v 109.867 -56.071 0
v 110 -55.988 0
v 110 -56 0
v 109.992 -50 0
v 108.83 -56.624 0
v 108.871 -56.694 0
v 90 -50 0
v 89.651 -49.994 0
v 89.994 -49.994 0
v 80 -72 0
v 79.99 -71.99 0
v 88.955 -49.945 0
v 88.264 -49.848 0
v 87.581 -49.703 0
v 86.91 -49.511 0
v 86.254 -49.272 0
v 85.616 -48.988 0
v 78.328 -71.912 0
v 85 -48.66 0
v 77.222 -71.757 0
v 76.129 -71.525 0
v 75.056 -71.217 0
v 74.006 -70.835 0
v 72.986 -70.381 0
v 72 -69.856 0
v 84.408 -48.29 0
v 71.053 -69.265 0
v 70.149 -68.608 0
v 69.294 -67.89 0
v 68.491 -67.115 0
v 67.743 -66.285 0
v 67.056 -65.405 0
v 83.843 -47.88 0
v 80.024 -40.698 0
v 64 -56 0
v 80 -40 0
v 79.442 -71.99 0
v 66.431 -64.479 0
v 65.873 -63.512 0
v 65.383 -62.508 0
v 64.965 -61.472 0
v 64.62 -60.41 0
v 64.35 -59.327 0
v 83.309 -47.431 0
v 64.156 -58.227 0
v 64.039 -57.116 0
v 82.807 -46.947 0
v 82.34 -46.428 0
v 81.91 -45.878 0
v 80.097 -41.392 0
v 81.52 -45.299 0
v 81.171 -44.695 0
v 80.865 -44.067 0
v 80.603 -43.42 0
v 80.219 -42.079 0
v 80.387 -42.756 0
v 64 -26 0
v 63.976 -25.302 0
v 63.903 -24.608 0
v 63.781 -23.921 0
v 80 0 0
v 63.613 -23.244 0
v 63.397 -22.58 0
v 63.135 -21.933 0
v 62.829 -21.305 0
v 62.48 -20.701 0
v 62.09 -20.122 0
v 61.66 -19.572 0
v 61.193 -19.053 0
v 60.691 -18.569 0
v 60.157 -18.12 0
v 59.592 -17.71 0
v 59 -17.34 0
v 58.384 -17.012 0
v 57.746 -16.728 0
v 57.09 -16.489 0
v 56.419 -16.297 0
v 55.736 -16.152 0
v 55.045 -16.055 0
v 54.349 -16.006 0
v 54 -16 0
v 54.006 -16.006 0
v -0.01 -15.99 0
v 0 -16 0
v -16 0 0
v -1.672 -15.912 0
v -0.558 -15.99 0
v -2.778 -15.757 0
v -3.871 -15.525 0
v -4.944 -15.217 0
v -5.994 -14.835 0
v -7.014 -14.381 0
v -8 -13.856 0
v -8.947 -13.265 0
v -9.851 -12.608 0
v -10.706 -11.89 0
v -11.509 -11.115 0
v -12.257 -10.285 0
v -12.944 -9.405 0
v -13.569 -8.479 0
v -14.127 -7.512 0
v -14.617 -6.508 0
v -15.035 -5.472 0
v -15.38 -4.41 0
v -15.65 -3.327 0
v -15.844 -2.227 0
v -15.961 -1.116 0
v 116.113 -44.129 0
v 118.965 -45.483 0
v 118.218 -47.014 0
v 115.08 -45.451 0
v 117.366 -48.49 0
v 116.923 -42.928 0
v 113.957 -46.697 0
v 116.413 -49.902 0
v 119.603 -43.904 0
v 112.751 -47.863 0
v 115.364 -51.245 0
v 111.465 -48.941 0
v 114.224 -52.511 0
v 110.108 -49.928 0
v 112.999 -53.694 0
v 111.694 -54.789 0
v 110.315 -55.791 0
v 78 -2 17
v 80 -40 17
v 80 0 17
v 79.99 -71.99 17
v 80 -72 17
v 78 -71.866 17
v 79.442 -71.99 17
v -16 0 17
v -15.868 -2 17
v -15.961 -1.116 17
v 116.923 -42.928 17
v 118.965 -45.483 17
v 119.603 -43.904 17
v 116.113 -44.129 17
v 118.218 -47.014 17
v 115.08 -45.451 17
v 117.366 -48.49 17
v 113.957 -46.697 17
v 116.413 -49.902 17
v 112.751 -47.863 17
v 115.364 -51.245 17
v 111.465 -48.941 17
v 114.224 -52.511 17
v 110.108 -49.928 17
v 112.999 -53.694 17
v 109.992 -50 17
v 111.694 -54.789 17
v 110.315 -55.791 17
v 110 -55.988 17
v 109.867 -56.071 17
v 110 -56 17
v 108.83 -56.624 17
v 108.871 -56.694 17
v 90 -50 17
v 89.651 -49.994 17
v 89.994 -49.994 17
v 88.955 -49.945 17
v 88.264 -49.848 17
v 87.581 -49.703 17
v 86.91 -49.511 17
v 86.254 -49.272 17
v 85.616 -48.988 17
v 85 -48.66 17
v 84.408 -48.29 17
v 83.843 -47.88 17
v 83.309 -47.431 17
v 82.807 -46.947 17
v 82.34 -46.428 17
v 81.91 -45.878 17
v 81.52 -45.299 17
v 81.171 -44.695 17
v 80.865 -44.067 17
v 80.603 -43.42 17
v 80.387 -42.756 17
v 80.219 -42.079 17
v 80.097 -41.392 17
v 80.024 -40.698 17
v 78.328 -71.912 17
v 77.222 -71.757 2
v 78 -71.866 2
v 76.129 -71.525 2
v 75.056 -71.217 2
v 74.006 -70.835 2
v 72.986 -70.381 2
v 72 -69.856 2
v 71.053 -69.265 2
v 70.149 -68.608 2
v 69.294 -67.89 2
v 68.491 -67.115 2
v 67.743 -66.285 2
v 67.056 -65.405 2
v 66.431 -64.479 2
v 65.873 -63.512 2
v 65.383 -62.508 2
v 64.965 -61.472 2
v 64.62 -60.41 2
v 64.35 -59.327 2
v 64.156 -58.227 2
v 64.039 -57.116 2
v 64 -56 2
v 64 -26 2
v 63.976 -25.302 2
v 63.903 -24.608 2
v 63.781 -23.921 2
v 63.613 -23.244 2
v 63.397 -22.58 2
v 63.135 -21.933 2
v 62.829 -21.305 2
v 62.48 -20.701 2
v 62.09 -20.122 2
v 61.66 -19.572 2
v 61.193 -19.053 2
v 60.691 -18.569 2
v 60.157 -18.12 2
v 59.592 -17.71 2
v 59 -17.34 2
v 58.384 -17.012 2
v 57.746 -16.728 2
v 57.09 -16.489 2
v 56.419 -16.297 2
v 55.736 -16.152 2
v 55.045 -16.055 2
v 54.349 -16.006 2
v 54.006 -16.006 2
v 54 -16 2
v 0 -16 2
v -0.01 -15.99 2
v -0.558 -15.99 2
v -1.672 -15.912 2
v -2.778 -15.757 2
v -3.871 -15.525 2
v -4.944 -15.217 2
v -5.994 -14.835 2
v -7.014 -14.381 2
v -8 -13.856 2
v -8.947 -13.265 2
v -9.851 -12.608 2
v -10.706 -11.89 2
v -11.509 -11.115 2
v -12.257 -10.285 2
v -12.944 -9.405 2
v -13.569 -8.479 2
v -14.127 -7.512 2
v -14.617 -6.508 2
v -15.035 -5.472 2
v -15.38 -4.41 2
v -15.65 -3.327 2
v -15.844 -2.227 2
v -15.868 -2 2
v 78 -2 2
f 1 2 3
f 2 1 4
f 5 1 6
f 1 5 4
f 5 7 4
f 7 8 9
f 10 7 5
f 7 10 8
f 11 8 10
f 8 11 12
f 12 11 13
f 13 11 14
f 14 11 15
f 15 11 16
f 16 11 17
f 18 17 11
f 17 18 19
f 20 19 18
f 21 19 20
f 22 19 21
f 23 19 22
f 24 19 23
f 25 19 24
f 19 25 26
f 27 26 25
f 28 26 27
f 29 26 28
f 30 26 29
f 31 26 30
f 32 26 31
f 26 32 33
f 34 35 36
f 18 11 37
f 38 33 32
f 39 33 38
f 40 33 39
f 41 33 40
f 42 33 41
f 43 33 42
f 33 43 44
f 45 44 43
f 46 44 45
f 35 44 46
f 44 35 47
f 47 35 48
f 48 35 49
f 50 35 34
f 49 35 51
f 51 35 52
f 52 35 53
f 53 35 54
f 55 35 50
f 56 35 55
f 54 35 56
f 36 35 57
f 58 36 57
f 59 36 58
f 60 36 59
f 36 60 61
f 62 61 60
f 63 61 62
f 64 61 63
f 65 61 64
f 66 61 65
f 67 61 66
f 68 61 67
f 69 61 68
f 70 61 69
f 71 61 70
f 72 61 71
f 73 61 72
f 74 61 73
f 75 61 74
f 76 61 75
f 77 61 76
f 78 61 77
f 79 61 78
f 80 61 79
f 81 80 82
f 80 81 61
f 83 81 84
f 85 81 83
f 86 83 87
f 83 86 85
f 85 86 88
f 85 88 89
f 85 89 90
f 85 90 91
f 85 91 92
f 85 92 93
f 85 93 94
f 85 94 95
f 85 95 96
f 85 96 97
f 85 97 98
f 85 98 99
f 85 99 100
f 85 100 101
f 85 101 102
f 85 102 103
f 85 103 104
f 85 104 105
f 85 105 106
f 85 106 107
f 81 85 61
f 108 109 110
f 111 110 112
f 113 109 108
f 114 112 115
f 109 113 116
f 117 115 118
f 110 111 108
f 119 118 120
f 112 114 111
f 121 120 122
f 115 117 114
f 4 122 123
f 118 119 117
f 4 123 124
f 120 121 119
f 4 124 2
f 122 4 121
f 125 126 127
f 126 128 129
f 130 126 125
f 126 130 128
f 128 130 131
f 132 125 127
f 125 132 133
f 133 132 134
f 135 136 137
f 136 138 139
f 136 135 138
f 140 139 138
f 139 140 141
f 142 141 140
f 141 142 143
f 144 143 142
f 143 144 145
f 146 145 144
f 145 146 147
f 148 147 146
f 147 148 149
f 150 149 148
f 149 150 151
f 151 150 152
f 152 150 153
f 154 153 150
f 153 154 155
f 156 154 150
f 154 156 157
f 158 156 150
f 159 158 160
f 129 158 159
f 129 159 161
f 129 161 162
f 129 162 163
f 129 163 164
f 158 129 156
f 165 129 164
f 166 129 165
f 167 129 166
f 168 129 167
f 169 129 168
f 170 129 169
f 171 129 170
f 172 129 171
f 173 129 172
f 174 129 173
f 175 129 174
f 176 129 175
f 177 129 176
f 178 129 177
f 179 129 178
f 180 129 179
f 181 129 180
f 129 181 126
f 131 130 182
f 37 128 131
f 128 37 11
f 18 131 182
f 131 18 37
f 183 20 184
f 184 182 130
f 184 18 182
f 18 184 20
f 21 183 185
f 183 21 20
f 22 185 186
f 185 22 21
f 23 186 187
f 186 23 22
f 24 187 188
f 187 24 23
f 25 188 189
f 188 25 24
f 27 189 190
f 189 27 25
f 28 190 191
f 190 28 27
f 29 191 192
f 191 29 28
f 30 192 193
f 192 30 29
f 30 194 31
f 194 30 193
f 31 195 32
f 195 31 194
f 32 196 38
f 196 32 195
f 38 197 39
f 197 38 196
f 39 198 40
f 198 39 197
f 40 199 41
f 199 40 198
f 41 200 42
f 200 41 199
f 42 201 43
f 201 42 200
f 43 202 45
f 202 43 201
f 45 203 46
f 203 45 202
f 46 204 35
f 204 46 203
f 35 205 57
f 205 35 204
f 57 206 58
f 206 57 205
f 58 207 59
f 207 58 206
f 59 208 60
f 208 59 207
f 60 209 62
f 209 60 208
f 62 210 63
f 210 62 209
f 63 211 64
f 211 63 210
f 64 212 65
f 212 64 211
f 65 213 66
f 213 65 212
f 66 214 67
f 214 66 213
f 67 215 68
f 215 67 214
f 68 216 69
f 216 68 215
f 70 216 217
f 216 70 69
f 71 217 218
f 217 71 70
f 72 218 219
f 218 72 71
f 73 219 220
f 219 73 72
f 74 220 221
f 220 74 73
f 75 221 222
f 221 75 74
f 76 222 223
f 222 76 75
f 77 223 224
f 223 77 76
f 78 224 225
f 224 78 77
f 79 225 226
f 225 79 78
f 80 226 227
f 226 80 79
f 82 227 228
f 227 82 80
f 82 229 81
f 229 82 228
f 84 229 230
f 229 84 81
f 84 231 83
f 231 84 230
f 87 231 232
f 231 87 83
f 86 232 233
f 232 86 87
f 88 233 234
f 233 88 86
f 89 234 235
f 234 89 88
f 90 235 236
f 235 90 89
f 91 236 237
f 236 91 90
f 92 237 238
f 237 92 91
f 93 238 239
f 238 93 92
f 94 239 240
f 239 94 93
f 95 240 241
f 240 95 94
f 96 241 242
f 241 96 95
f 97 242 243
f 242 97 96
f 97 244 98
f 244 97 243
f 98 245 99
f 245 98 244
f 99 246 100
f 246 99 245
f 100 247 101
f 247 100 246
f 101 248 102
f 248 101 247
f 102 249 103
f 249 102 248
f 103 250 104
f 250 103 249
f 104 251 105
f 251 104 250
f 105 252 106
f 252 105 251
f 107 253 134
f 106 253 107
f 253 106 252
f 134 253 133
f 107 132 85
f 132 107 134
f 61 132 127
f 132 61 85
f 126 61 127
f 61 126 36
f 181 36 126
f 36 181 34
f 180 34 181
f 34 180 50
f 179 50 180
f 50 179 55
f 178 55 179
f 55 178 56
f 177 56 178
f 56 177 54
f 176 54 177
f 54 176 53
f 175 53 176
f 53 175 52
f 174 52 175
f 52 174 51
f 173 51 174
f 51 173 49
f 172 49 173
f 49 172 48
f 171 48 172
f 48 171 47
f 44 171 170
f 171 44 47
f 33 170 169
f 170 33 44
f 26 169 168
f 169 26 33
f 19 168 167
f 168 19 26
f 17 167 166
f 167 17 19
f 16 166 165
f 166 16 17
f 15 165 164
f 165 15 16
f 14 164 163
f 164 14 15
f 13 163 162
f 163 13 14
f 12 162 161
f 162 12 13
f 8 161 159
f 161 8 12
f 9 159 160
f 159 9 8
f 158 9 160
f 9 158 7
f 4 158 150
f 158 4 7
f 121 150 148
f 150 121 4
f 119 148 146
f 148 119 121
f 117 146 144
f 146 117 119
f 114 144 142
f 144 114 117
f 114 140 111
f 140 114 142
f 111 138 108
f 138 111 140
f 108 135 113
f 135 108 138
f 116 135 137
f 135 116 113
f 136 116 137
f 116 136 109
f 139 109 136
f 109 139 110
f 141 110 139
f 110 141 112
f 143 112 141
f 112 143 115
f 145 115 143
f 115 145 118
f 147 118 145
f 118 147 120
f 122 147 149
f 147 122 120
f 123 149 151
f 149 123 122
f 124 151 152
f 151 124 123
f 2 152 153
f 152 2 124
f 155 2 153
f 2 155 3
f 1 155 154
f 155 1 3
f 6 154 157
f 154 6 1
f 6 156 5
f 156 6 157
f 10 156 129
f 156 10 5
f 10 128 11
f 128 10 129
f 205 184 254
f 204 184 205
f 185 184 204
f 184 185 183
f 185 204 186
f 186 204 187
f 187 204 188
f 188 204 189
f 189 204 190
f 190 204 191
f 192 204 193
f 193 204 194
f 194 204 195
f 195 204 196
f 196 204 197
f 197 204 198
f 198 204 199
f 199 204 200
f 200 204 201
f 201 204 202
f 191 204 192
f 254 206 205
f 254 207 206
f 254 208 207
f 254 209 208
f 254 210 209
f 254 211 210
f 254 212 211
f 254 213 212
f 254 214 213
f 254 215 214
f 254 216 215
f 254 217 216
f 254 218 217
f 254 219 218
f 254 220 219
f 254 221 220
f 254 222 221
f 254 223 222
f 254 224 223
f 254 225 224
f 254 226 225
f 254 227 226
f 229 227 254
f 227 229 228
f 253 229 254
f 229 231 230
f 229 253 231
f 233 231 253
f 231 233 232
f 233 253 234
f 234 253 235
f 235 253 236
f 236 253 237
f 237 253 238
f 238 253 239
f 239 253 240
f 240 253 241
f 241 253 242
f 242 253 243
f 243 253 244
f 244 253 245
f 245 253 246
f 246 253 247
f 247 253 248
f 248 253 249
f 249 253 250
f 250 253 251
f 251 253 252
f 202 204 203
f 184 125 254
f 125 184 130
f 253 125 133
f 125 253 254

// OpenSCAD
// file: arc.scad
//==============================================================================
// (C) COPYRIGHT 2018 TPSEC
// File: MyMonitorHook.scad
//
//
//=============================================================================

/** @defgroup MyMonitorHook Platform to hook the headphones in left/right side of monitor
 *  @ingroup MyMonitorHook
 *  @brief \n

	@details


	Written by Eusebio Tebar
	mailto:etebar AT tpsec DOT com DOT es

	Current version:
	v. 1.0:
 @{
 */

 /**
	@ingroup  MonitorHook
	Desing Status. This definition is used for design status traceability\n
	- Code	 -> State
	- 0x0000 -> Template
	- 0x0001 -> Preliminary
	- 0x0010 -> Debug
	- 0x0100 -> Test
	- 0x1000 -> Release
*/

//MyMonitorHook				(0x0000)

/****************************************************************************
	Parameters
****************************************************************************/

/****************************************************************************
	Modules
****************************************************************************/

module arc180(radius, angle){
	rotate(a = angle, v= [0,0,1])
	difference(){
		circle(radius);
		//rotate(a = angle, v= [0,0,1])
			translate([-radius,0,0])
				square([2*radius,radius],false);
		rotate(a = 90 - angle, v= [0,0,1])
			translate([-radius,-radius,0])
				square([radius,2*radius],false);
	}
}


/****************************************************************************
	Render
****************************************************************************/
// rotate(a = 10, v= [0,0,1])
// 	arc180(10,10);


/*
|| @changelog
|| | Issue		Date		Name			Comment
|| | --------	-----------	------------	---------------------------------
|| | 1.0.0.X 	17/01/2019 - E. Tebar : 	Initial Release
|| #
*/
/***************************************************************************/
/** @} */ /*	End of file */
/***************************************************************************/
// main file
//==============================================================================
// (C) COPYRIGHT 2018 TPSEC
// File: MyMonitorHook.scad
//
//
//=============================================================================

/** @defgroup MyMonitorHook Platform to hook the headphones in left/right side of monitor
 *  @ingroup MyMonitorHook
 *  @brief \n

	@details


	Written by Eusebio Tebar
	mailto:etebar AT tpsec DOT com DOT es

	Current version:
	v. 1.0:
 @{
 */

 /**
	@ingroup  MonitorHook
	Desing Status. This definition is used for design status traceability\n
	- Code	 -> State
	- 0x0000 -> Template
	- 0x0001 -> Preliminary
	- 0x0010 -> Debug
	- 0x0100 -> Test
	- 0x1000 -> Release
*/

//MyMonitorHook				(0x0000)
include <arc.scad>
/****************************************************************************
	Parameters
****************************************************************************/

/* [Hidden] */
$fa = 4;
$fs = 0.5;



height_front=16;
text_line1="D. Santos";
text_line2="Knorr-Bremse";
font_size=6;

hookThickness	= 2;
MonitorHeight	= 17;
hookHeight 		= 40;
hookLength		= 20;
topLength 		= 2*hookHeight;
topBezel 		= 16;
r34 			= 10;
r56 			= 10;
r67 			= 16;
r89				= topBezel;
r1011			= 10;
r1213			= topBezel;

// arcUpCrochet	= 8*r56;
// angleUpCrochet	= 200;									// TODO link with hookLength and hookHeight
arcUpCrochet		= 80;
angleUpCrochet		= 200;
echo(arcUpCrochet,angleUpCrochet);

// arcDownCrochet		= 3.5*r56;
// angleDownCrochet	= 190;
arcDownCrochet		= 40;
angleDownCrochet	= 200;
echo(arcDownCrochet,angleDownCrochet);



/****************************************************************************
	Modules
****************************************************************************/
						
p1x = 0;												p1y = 0;											// echo("p1x  :",p1x ,"p1y :",p1y );	
p2x = p1x-topLength;									p2y = 0;											// echo("p2x  :",p2x ,"p2y :",p2y );	
p3x = p2x;												p3y = p2y - hookHeight;								// echo("p3x  :",p3x ,"p3y :",p3y );	
p4x = p3x - r34;										p4y = p3y - r34;									// echo("p4x  :",p4x ,"p4y :",p4y );	
p5x = p4x - hookLength;									p5y = p4y;											// echo("p5x  :",p5x ,"p5y :",p5y );	
p6x = p5x - r56;										p6y = p5y + r56;									// echo("p6x  :",p6x ,"p6y :",p6y );	
p7x = p5x;												p7y = p5y - (r67-r56);								// echo("p7x  :",p7x ,"p7y :",p7y );	
p8x = p2x;												p8y = p7y - r89;									// echo("p8x  :",p8x ,"p8y :",p8y );	
p9x = p8x + r89;										p9y = p7y;											// echo("p9x  :",p9x ,"p9y :",p9y );	
p10x = p9x;												p10y = -topBezel - r1011;							// echo("p10x :",p10x,"p10y:",p10y);	
p11x = p10x + r1011;									p11y = -topBezel ;									// echo("p11x :",p11x,"p11y:",p11y);	
p12x = p1x;												p12y = p11y;										// echo("p12x :",p12x,"p12y:",p12y);	
p13x = p1x + r1213;										p13y = 0;											// echo("p13x :",p13x,"p13y:",p13y);	

pUpCrochetCenterx = p4x - (1*hookLength/3);				pUpCrochetCentery = p6y + (hookHeight/4);			// echo("pUpCrochetCenterx :",pUpCrochetCenterx,"pUpCrochetCentery:",pUpCrochetCentery);	
pDownCrochetCenterx = p4x - (1*hookLength/3);			pDownCrochetCentery = - (8*hookHeight/9);			// echo("pDownCrochetCenterx :",pDownCrochetCenterx,"pDownCrochetCentery:",pDownCrochetCentery);	


Ux = p5x - pUpCrochetCenterx;																				// echo("Ux",Ux);
Uy = p5y - pUpCrochetCentery;																				// echo("Uy",Uy);
pUpCrochetRadio = sqrt((Ux*Ux)+(Uy*Uy));																	// echo("pDownCrochetRadio",pDownCrochetRadio);


Dx = p7x - pDownCrochetCenterx;																				// echo("Dx",Dx);
Dy = p7y - pDownCrochetCentery;																				// echo("Dy",Dy);
pDownCrochetRadio = sqrt((Dx*Dx)+(Dy*Dy));																	// echo("pDownCrochetRadio",pDownCrochetRadio);

// Side Profile in 2D
module Side_Profile() {

difference(){
	union(){
		polygon	([
				[p1x,p1y],	[p2x,p2y],	[p3x,p3y],	[p4x,p4y],	[p5x,p5y],	//[p6x,p6y],
				[p7x,p7y],	[p8x,p8y],	[p9x,p9y],	[p10x,p10y],[p11x,p11y],[p12x,p12y],
				[p13x,p13y]
				]);
		rotate(a = -90, v= [0,0,1])
			 arc180(r1213,90);

		translate([p8x,p9y,0])
			rotate(a = -90, v= [0,0,1])
				arc180(r89,90);

		Crochet();
		}
	translate([p4x,p3y,0])
		rotate(a = -90, v= [0,0,1])
			arc180(r34,90);

	translate([p11x,p10y,0])
		rotate(a = 90, v= [0,0,1])
			arc180(r1011,90);

	}
}

module Crochet(){

	difference(){
		 translate([pDownCrochetCenterx,pDownCrochetCentery,0])
		  	rotate(a = angleDownCrochet, v= [0,0,1])
		 	 	 arc180(pDownCrochetRadio,arcDownCrochet);

		translate([pUpCrochetCenterx,pUpCrochetCentery,0])
		 	rotate(a = angleUpCrochet, v= [0,0,1])
		 	 	 arc180(pUpCrochetRadio,arcUpCrochet);
		}
}

module Hook(MirrorOption, withtext){
	difference(){
	// Profile extruded
	linear_extrude(height = MonitorHeight) 
	 	Side_Profile();

	// Remove material
	translate([p2x+hookThickness,  p8y - hookThickness, hookThickness])
		cube([topLength+p13x,-p8y,MonitorHeight]);		//echo("cubo :",topLength+p13x,-p8y,MonitorHeight);

	// text on the board

	mirror([MirrorOption,0,0]){	
		if (withtext){
		 	rotate([0,180,0]){
				//text line 1
				translate ([-MirrorOption*topLength,0,-hookThickness-1]){
			    	translate([topLength-(2*hookThickness), -font_size-1.85]) {
			 		    linear_extrude(height = 2*hookThickness) {
			     			text(text_line1, font = "Liberation Sans",size=font_size,halign="right" );
			 				}
			 			}
			    	//text line 2
			 		translate([topLength-(2*hookThickness), -font_size*1.85-1.85*2]) {
			 			linear_extrude(height = 2*hookThickness) {
			     			text(text_line2, font = "Liberation Sans",size=font_size,halign="right" );
			 				}
			 			}
			 		}
				}
			}
		}
	}
}

/****************************************************************************
	Render
****************************************************************************/
RightSide=1;
withName		= 0;
mirror([RightSide,0,0]){	
		Hook(RightSide,withName);
		}


/*
|| @changelog
|| | Issue		Date		Name			Comment
|| | --------	-----------	------------	---------------------------------
|| | 1.0.0.X 	17/01/2019 - E. Tebar : 	Initial Release
|| #
*/
/***************************************************************************/
/** @} */ /*	End of file */
/***************************************************************************/
